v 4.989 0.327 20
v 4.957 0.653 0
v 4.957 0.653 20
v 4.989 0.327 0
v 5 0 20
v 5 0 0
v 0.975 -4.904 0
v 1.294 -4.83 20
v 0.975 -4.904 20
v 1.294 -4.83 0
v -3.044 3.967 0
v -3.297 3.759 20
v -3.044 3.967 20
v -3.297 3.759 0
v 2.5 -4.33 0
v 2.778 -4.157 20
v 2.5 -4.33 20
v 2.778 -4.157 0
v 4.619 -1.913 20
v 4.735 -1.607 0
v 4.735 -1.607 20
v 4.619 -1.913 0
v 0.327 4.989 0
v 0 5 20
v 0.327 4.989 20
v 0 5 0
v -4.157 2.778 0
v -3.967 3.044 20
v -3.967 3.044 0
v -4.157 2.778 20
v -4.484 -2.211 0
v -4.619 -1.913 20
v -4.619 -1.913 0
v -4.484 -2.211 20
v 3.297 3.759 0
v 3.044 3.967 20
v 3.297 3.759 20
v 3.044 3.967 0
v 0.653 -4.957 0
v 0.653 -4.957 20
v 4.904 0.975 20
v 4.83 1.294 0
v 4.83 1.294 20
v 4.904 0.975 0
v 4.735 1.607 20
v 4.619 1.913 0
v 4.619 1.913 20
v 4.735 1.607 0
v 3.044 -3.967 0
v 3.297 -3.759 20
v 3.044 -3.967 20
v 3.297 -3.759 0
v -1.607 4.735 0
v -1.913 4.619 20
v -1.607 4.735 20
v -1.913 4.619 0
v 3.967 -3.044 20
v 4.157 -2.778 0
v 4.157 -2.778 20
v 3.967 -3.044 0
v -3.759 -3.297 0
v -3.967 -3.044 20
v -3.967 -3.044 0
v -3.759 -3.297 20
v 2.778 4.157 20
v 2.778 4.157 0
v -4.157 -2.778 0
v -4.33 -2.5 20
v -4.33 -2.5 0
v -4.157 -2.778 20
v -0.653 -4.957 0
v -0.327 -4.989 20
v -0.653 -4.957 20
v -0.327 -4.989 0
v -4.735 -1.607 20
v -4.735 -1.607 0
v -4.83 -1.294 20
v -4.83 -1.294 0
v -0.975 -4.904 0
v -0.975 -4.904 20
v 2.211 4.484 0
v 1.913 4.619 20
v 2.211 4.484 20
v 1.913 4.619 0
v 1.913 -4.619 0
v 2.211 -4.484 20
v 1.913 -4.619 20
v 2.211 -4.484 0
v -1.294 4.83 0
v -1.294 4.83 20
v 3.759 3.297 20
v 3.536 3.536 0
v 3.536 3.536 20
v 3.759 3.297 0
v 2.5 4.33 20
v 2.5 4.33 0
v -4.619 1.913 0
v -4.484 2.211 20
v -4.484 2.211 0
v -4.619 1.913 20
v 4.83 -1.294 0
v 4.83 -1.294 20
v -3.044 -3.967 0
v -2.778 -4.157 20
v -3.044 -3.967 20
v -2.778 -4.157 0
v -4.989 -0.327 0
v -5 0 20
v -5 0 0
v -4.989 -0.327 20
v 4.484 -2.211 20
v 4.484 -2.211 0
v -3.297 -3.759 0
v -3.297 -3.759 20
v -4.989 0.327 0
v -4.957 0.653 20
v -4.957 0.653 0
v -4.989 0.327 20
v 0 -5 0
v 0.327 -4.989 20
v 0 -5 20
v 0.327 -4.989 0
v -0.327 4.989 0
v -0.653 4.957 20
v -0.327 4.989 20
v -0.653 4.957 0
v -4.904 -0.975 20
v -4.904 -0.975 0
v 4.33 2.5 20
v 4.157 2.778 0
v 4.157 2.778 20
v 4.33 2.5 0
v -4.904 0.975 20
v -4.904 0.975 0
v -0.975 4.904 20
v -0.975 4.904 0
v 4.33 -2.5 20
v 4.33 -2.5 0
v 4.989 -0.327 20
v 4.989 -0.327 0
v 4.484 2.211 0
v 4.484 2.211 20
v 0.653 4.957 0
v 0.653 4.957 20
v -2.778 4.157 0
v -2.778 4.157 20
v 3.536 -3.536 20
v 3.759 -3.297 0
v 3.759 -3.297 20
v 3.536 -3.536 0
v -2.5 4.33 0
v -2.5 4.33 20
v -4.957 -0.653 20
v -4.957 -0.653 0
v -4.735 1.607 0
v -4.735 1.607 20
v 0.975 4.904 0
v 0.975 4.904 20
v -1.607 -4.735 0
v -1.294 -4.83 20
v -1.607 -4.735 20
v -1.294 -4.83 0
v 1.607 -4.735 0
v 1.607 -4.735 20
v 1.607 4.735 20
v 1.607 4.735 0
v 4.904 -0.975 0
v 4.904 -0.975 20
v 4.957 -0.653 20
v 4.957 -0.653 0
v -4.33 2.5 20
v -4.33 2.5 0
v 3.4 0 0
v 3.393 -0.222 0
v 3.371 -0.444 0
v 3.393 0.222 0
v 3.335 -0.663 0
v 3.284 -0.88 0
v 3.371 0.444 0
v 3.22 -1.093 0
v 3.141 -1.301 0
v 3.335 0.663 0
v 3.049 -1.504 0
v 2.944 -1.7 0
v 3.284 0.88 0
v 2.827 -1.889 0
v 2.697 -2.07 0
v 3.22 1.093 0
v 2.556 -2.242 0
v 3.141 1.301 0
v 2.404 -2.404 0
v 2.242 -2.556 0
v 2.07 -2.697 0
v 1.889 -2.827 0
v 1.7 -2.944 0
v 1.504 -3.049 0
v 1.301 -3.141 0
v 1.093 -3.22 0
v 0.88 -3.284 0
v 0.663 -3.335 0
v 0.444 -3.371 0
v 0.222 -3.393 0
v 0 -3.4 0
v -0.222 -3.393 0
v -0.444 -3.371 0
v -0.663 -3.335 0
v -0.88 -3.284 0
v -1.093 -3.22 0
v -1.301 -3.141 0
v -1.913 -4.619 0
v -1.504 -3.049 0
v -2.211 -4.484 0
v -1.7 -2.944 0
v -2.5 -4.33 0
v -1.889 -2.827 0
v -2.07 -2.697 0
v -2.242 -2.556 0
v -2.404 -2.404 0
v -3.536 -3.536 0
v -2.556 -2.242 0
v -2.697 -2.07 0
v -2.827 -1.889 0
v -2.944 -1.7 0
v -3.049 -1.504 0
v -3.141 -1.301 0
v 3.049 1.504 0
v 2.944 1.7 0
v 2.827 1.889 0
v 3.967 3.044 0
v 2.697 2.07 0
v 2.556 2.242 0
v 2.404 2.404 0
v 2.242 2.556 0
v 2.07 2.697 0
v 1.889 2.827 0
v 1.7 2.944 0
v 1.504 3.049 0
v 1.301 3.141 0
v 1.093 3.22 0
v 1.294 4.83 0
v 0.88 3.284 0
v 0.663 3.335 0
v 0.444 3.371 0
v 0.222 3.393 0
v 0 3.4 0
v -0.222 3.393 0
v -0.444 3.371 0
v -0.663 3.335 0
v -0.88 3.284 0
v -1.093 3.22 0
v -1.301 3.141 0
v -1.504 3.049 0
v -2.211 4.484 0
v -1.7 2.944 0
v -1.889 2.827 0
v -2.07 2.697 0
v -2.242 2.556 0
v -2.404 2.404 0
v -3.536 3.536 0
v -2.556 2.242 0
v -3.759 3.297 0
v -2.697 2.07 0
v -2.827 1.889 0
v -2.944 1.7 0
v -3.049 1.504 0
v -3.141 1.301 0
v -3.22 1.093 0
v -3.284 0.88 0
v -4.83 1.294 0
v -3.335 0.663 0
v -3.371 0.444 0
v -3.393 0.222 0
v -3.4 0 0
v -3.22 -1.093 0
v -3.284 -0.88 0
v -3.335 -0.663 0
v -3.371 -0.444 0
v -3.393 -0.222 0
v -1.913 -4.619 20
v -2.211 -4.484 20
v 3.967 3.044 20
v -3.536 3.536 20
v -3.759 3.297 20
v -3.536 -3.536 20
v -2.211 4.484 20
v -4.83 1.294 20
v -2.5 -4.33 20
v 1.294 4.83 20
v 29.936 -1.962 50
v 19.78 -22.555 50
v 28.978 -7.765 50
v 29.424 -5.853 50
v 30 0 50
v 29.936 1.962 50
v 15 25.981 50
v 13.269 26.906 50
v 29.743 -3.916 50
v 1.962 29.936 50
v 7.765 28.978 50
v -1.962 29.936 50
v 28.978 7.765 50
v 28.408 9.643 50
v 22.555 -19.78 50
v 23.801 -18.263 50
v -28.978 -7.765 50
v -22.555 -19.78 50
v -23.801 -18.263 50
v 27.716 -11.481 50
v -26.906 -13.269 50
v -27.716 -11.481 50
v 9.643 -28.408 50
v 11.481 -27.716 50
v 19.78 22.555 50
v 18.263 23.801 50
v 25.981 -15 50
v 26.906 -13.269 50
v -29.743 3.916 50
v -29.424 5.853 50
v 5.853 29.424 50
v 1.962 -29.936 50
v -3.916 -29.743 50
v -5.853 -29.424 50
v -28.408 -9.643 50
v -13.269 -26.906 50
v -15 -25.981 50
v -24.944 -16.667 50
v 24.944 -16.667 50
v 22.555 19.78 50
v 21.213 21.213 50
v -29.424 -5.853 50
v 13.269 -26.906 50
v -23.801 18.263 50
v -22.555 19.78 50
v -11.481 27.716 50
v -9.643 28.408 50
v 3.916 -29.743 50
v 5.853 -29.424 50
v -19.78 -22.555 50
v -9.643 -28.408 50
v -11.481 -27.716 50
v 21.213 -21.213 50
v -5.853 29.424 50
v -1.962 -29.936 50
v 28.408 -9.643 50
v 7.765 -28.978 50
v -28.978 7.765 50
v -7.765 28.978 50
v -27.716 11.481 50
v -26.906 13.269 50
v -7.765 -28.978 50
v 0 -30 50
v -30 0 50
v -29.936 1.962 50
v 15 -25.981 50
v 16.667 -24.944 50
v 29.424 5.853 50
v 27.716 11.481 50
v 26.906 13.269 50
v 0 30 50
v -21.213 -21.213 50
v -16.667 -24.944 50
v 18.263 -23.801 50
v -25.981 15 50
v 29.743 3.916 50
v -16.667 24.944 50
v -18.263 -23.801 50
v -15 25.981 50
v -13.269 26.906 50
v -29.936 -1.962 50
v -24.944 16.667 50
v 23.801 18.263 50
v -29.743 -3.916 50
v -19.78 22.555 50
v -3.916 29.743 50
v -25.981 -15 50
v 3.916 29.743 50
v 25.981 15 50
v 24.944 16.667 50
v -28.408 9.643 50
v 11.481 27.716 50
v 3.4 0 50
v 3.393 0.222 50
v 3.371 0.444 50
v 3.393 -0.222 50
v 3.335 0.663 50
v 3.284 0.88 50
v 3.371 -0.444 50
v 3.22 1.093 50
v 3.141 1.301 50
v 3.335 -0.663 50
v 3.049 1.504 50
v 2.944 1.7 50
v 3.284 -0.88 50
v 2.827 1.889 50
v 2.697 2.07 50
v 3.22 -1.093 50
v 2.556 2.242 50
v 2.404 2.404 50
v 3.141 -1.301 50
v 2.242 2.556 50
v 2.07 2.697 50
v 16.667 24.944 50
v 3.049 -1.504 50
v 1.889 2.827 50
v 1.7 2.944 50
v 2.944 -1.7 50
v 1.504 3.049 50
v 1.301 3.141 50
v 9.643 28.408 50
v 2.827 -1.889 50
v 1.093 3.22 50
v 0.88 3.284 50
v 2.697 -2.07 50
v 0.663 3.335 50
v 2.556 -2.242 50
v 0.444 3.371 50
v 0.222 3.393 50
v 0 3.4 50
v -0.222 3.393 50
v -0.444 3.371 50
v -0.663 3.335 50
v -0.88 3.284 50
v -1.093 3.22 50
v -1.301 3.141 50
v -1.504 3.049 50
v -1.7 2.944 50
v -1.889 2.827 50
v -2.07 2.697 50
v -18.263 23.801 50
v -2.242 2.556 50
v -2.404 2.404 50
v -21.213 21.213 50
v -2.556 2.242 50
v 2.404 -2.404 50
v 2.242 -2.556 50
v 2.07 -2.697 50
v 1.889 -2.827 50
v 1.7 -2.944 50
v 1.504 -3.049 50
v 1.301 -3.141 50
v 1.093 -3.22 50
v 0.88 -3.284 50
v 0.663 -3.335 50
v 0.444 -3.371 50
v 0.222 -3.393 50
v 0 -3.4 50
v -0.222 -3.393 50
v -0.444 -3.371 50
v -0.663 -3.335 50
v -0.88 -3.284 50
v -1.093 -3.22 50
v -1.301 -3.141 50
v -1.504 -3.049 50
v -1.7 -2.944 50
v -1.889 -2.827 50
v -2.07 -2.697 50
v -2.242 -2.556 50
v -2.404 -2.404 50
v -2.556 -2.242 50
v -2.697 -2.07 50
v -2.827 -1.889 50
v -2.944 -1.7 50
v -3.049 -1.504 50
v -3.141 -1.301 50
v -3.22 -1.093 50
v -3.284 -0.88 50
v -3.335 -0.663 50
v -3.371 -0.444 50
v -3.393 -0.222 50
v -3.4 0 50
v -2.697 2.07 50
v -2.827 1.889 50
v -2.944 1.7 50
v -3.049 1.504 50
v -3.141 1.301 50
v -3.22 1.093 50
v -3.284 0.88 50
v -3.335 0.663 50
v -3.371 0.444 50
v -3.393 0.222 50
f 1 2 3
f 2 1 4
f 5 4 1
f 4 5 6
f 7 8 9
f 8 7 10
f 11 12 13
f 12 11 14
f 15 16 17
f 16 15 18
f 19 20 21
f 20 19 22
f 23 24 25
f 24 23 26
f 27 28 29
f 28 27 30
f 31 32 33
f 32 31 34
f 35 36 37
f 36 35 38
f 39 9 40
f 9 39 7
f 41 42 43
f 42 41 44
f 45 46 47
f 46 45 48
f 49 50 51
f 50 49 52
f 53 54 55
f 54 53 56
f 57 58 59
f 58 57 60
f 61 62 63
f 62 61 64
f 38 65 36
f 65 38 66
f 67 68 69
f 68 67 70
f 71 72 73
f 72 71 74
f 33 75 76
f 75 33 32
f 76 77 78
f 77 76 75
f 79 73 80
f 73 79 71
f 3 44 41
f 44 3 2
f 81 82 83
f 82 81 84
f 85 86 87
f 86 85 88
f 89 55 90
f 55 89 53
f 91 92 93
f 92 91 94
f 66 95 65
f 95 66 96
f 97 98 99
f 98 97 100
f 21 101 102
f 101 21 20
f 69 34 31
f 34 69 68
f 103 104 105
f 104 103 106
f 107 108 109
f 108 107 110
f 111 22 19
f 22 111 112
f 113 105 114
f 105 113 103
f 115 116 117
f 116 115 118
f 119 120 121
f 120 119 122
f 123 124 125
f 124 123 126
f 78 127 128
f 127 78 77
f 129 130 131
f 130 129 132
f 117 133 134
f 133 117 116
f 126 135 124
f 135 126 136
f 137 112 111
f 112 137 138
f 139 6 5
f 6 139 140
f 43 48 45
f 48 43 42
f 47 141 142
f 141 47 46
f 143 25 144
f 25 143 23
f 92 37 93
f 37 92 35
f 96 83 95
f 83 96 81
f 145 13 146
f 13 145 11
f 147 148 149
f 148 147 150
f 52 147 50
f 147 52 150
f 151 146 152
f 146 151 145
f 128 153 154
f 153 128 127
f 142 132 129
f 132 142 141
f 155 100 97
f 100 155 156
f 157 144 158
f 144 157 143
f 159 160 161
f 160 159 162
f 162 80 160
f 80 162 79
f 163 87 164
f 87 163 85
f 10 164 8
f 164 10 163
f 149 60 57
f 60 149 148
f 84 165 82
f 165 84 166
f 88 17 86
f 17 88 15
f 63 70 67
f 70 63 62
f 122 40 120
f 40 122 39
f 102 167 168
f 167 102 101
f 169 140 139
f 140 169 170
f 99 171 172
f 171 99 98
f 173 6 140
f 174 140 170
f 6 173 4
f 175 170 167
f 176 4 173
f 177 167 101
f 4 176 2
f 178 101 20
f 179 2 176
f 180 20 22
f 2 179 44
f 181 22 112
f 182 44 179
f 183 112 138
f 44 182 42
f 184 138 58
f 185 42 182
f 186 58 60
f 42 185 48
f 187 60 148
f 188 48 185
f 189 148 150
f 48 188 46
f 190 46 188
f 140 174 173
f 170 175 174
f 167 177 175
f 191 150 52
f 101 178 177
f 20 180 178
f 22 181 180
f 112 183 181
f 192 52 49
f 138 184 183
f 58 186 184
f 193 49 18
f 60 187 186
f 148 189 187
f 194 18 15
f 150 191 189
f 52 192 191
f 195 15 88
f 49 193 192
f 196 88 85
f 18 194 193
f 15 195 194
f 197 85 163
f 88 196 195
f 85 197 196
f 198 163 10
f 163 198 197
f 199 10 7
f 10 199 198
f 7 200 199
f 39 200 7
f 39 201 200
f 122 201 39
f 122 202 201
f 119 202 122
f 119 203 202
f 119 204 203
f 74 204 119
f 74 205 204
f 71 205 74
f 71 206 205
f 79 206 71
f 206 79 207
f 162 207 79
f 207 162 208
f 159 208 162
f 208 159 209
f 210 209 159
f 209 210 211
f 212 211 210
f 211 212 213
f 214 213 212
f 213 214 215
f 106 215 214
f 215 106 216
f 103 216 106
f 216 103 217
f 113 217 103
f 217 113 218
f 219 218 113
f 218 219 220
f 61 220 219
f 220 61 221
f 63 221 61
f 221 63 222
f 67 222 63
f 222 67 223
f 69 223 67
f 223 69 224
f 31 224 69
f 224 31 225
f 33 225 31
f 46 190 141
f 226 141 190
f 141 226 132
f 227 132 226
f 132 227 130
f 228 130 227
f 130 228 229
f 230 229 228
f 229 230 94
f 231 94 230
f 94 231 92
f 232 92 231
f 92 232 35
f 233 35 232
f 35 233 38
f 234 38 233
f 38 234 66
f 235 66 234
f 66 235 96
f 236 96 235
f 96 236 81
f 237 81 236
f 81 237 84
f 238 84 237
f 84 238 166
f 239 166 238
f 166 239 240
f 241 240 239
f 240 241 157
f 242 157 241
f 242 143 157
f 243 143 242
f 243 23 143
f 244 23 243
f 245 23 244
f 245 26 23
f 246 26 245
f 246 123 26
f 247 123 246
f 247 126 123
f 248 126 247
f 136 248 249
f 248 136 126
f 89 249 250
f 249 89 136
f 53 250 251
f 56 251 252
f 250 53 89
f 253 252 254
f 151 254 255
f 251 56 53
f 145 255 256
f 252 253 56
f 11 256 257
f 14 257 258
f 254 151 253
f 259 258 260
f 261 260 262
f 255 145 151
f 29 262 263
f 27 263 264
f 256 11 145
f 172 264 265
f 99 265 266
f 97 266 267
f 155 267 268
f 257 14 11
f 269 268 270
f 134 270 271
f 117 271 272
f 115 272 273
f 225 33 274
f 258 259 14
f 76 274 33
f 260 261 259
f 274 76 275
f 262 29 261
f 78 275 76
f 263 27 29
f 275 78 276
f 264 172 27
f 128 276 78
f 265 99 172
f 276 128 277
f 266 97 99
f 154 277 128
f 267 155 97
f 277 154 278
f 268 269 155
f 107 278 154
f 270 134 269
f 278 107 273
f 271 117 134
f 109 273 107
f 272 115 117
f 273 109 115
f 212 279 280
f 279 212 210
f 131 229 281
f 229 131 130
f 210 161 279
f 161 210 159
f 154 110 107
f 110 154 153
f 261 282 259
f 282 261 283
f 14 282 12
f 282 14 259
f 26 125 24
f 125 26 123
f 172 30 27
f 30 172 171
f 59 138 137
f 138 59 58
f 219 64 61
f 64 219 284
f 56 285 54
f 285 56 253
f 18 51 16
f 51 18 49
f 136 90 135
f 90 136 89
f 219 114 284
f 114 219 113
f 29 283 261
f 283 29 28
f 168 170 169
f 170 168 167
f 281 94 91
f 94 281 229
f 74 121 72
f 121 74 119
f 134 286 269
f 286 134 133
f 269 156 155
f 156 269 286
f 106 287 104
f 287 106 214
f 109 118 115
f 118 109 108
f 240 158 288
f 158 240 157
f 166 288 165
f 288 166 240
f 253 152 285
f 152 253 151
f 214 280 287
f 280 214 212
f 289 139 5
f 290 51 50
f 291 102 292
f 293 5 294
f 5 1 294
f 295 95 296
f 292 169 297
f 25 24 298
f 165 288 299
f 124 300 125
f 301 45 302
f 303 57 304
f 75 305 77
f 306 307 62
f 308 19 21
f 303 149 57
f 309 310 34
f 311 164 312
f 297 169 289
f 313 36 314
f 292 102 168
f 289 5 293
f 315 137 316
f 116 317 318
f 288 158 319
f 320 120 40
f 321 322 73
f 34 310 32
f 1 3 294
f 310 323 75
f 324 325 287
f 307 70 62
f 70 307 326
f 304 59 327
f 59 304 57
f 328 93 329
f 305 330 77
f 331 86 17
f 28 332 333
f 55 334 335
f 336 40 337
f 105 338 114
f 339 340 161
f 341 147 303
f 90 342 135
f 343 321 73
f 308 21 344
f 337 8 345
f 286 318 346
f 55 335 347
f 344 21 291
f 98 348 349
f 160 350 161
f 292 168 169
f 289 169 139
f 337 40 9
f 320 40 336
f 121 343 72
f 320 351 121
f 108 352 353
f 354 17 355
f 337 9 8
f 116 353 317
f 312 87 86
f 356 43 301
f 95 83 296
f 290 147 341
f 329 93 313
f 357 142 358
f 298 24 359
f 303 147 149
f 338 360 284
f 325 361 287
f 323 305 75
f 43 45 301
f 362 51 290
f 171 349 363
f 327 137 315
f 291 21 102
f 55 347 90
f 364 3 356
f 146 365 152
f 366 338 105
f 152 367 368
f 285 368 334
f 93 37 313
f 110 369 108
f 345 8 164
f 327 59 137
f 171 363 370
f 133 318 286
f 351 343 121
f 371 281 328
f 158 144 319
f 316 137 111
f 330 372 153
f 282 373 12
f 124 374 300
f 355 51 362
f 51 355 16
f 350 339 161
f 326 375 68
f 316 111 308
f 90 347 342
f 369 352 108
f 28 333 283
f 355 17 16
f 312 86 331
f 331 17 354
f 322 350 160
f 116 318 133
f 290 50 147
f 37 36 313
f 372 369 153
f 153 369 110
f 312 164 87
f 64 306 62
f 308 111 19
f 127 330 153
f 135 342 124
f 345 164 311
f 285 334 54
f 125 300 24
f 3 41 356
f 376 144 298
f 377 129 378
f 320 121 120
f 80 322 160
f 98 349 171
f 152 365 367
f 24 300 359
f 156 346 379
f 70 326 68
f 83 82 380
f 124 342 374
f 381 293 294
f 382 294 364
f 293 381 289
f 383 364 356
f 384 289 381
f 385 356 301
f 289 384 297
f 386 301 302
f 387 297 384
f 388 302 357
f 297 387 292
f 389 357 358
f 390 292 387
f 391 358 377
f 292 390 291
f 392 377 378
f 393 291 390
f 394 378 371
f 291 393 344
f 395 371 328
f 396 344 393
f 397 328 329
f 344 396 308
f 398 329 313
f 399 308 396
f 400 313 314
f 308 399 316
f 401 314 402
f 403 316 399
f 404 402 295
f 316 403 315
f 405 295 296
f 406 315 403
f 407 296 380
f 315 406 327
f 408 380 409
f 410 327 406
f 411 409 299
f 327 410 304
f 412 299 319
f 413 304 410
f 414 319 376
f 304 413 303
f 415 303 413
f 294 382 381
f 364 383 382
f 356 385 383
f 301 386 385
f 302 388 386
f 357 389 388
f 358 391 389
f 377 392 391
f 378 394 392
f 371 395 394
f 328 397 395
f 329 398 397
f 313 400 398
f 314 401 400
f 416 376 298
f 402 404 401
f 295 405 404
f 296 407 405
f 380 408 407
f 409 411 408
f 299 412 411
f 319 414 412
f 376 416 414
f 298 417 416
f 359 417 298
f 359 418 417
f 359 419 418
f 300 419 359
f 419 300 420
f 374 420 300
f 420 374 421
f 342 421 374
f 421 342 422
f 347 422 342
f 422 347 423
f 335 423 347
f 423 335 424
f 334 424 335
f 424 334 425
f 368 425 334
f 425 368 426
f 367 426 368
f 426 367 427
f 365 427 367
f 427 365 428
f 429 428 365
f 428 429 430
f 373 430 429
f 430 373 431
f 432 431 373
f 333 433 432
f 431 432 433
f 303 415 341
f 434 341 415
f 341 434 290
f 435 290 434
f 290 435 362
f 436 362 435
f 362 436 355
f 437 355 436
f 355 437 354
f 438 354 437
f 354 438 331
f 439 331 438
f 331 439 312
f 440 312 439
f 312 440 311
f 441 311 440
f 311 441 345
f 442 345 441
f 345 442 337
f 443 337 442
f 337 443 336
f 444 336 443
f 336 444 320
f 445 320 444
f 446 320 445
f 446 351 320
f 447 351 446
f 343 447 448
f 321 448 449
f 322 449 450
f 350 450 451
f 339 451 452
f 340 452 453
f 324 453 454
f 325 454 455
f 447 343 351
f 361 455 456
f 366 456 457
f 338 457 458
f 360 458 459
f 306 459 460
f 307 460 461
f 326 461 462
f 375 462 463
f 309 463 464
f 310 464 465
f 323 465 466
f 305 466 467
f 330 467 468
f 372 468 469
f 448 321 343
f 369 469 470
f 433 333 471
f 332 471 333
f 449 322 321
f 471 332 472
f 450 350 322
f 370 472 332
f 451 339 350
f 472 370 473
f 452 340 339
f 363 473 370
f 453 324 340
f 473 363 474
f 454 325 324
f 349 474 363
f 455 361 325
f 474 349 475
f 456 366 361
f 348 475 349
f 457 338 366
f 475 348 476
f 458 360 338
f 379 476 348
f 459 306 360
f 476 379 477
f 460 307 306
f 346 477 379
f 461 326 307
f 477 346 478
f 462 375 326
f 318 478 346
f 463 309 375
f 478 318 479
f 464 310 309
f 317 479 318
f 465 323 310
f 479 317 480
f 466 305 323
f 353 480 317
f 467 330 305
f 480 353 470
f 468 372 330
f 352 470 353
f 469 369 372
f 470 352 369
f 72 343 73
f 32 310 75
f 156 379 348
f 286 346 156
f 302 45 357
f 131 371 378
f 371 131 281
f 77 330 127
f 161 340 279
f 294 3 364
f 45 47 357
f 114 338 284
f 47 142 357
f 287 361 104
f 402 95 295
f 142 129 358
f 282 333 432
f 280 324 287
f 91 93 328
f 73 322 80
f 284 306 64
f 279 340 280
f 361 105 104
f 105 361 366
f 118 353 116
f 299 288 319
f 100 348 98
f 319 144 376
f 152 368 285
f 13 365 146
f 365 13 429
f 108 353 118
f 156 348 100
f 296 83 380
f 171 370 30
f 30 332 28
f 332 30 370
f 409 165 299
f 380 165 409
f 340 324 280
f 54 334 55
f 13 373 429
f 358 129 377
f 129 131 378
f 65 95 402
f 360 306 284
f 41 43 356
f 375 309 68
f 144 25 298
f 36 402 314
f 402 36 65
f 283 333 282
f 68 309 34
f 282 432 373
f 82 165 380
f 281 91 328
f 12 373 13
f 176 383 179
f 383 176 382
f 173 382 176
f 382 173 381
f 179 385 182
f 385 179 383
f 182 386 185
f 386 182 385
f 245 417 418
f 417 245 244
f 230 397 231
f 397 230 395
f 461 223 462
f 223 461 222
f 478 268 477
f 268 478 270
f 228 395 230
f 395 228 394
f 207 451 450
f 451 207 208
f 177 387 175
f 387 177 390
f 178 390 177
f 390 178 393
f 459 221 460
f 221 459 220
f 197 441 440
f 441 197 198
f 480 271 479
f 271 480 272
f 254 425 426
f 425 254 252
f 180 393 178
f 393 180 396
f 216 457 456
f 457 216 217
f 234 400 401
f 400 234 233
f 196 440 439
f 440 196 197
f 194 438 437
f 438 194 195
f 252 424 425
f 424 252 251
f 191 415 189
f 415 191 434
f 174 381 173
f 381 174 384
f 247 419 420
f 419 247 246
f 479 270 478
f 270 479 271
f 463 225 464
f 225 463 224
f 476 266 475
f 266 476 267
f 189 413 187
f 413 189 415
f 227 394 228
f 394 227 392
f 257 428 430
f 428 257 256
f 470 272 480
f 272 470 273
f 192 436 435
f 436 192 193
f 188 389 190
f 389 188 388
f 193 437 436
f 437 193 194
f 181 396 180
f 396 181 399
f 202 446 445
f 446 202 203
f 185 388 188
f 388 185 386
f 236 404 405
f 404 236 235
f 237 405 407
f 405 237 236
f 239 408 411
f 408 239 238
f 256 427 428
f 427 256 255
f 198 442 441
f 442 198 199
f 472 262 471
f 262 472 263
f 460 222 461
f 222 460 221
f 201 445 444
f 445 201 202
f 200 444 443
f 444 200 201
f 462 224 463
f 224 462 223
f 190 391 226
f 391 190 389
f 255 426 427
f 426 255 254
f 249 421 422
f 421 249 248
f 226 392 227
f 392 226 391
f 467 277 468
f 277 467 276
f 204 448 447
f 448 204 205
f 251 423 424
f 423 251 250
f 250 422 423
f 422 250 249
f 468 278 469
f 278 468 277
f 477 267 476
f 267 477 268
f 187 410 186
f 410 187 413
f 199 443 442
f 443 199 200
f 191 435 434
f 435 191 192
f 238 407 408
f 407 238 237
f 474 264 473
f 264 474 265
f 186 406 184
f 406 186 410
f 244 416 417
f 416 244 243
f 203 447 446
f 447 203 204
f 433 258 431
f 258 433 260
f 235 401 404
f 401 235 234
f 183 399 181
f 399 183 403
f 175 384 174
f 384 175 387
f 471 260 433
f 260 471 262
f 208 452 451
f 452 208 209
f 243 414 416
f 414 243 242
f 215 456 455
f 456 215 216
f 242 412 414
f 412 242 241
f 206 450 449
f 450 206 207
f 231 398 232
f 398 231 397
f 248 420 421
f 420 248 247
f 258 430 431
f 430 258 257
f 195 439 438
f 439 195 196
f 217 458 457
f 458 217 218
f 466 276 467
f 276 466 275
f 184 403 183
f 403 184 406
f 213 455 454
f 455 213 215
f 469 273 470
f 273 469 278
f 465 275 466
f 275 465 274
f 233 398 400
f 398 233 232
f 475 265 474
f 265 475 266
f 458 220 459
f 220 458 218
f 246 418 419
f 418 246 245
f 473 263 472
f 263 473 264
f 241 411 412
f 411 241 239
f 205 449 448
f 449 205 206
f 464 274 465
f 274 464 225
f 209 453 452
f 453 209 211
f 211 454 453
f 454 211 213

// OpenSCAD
// Funnel with straight spout - printed upright, wide opening at top
// Units: mm. Wall thickness: 1.6 mm throughout.

$fn = 96;

// ---- Spout (tube) ----
spout_od     = 10;    // spout outer diameter
spout_id     = spout_od - 2 * 1.6;  // spout bore (6.8 mm)
spout_len    = 20;    // spout length (z = 0 to 20)

// ---- Cone (funnel body) ----
cone_d0      = 10;    // cone outer diameter at z = 20 (joins spout)
cone_d1      = 60;    // cone outer diameter at rim (z = 50)
cone_h       = 30;    // cone height (z = 20 to 50)

// ---- Cutting overlap ----
eps          = 0.5;   // extension of cutters past faces

difference() {
    union() {
        // Spout
        cylinder(h = spout_len, d = spout_od);
        // Cone
        translate([0, 0, spout_len])
            cylinder(h = cone_h, d1 = cone_d0, d2 = cone_d1);
    }
    // Through-bore: spout bore extended through the cone
    translate([0, 0, -eps])
        cylinder(h = spout_len + cone_h + 2 * eps, d = spout_id);
}
